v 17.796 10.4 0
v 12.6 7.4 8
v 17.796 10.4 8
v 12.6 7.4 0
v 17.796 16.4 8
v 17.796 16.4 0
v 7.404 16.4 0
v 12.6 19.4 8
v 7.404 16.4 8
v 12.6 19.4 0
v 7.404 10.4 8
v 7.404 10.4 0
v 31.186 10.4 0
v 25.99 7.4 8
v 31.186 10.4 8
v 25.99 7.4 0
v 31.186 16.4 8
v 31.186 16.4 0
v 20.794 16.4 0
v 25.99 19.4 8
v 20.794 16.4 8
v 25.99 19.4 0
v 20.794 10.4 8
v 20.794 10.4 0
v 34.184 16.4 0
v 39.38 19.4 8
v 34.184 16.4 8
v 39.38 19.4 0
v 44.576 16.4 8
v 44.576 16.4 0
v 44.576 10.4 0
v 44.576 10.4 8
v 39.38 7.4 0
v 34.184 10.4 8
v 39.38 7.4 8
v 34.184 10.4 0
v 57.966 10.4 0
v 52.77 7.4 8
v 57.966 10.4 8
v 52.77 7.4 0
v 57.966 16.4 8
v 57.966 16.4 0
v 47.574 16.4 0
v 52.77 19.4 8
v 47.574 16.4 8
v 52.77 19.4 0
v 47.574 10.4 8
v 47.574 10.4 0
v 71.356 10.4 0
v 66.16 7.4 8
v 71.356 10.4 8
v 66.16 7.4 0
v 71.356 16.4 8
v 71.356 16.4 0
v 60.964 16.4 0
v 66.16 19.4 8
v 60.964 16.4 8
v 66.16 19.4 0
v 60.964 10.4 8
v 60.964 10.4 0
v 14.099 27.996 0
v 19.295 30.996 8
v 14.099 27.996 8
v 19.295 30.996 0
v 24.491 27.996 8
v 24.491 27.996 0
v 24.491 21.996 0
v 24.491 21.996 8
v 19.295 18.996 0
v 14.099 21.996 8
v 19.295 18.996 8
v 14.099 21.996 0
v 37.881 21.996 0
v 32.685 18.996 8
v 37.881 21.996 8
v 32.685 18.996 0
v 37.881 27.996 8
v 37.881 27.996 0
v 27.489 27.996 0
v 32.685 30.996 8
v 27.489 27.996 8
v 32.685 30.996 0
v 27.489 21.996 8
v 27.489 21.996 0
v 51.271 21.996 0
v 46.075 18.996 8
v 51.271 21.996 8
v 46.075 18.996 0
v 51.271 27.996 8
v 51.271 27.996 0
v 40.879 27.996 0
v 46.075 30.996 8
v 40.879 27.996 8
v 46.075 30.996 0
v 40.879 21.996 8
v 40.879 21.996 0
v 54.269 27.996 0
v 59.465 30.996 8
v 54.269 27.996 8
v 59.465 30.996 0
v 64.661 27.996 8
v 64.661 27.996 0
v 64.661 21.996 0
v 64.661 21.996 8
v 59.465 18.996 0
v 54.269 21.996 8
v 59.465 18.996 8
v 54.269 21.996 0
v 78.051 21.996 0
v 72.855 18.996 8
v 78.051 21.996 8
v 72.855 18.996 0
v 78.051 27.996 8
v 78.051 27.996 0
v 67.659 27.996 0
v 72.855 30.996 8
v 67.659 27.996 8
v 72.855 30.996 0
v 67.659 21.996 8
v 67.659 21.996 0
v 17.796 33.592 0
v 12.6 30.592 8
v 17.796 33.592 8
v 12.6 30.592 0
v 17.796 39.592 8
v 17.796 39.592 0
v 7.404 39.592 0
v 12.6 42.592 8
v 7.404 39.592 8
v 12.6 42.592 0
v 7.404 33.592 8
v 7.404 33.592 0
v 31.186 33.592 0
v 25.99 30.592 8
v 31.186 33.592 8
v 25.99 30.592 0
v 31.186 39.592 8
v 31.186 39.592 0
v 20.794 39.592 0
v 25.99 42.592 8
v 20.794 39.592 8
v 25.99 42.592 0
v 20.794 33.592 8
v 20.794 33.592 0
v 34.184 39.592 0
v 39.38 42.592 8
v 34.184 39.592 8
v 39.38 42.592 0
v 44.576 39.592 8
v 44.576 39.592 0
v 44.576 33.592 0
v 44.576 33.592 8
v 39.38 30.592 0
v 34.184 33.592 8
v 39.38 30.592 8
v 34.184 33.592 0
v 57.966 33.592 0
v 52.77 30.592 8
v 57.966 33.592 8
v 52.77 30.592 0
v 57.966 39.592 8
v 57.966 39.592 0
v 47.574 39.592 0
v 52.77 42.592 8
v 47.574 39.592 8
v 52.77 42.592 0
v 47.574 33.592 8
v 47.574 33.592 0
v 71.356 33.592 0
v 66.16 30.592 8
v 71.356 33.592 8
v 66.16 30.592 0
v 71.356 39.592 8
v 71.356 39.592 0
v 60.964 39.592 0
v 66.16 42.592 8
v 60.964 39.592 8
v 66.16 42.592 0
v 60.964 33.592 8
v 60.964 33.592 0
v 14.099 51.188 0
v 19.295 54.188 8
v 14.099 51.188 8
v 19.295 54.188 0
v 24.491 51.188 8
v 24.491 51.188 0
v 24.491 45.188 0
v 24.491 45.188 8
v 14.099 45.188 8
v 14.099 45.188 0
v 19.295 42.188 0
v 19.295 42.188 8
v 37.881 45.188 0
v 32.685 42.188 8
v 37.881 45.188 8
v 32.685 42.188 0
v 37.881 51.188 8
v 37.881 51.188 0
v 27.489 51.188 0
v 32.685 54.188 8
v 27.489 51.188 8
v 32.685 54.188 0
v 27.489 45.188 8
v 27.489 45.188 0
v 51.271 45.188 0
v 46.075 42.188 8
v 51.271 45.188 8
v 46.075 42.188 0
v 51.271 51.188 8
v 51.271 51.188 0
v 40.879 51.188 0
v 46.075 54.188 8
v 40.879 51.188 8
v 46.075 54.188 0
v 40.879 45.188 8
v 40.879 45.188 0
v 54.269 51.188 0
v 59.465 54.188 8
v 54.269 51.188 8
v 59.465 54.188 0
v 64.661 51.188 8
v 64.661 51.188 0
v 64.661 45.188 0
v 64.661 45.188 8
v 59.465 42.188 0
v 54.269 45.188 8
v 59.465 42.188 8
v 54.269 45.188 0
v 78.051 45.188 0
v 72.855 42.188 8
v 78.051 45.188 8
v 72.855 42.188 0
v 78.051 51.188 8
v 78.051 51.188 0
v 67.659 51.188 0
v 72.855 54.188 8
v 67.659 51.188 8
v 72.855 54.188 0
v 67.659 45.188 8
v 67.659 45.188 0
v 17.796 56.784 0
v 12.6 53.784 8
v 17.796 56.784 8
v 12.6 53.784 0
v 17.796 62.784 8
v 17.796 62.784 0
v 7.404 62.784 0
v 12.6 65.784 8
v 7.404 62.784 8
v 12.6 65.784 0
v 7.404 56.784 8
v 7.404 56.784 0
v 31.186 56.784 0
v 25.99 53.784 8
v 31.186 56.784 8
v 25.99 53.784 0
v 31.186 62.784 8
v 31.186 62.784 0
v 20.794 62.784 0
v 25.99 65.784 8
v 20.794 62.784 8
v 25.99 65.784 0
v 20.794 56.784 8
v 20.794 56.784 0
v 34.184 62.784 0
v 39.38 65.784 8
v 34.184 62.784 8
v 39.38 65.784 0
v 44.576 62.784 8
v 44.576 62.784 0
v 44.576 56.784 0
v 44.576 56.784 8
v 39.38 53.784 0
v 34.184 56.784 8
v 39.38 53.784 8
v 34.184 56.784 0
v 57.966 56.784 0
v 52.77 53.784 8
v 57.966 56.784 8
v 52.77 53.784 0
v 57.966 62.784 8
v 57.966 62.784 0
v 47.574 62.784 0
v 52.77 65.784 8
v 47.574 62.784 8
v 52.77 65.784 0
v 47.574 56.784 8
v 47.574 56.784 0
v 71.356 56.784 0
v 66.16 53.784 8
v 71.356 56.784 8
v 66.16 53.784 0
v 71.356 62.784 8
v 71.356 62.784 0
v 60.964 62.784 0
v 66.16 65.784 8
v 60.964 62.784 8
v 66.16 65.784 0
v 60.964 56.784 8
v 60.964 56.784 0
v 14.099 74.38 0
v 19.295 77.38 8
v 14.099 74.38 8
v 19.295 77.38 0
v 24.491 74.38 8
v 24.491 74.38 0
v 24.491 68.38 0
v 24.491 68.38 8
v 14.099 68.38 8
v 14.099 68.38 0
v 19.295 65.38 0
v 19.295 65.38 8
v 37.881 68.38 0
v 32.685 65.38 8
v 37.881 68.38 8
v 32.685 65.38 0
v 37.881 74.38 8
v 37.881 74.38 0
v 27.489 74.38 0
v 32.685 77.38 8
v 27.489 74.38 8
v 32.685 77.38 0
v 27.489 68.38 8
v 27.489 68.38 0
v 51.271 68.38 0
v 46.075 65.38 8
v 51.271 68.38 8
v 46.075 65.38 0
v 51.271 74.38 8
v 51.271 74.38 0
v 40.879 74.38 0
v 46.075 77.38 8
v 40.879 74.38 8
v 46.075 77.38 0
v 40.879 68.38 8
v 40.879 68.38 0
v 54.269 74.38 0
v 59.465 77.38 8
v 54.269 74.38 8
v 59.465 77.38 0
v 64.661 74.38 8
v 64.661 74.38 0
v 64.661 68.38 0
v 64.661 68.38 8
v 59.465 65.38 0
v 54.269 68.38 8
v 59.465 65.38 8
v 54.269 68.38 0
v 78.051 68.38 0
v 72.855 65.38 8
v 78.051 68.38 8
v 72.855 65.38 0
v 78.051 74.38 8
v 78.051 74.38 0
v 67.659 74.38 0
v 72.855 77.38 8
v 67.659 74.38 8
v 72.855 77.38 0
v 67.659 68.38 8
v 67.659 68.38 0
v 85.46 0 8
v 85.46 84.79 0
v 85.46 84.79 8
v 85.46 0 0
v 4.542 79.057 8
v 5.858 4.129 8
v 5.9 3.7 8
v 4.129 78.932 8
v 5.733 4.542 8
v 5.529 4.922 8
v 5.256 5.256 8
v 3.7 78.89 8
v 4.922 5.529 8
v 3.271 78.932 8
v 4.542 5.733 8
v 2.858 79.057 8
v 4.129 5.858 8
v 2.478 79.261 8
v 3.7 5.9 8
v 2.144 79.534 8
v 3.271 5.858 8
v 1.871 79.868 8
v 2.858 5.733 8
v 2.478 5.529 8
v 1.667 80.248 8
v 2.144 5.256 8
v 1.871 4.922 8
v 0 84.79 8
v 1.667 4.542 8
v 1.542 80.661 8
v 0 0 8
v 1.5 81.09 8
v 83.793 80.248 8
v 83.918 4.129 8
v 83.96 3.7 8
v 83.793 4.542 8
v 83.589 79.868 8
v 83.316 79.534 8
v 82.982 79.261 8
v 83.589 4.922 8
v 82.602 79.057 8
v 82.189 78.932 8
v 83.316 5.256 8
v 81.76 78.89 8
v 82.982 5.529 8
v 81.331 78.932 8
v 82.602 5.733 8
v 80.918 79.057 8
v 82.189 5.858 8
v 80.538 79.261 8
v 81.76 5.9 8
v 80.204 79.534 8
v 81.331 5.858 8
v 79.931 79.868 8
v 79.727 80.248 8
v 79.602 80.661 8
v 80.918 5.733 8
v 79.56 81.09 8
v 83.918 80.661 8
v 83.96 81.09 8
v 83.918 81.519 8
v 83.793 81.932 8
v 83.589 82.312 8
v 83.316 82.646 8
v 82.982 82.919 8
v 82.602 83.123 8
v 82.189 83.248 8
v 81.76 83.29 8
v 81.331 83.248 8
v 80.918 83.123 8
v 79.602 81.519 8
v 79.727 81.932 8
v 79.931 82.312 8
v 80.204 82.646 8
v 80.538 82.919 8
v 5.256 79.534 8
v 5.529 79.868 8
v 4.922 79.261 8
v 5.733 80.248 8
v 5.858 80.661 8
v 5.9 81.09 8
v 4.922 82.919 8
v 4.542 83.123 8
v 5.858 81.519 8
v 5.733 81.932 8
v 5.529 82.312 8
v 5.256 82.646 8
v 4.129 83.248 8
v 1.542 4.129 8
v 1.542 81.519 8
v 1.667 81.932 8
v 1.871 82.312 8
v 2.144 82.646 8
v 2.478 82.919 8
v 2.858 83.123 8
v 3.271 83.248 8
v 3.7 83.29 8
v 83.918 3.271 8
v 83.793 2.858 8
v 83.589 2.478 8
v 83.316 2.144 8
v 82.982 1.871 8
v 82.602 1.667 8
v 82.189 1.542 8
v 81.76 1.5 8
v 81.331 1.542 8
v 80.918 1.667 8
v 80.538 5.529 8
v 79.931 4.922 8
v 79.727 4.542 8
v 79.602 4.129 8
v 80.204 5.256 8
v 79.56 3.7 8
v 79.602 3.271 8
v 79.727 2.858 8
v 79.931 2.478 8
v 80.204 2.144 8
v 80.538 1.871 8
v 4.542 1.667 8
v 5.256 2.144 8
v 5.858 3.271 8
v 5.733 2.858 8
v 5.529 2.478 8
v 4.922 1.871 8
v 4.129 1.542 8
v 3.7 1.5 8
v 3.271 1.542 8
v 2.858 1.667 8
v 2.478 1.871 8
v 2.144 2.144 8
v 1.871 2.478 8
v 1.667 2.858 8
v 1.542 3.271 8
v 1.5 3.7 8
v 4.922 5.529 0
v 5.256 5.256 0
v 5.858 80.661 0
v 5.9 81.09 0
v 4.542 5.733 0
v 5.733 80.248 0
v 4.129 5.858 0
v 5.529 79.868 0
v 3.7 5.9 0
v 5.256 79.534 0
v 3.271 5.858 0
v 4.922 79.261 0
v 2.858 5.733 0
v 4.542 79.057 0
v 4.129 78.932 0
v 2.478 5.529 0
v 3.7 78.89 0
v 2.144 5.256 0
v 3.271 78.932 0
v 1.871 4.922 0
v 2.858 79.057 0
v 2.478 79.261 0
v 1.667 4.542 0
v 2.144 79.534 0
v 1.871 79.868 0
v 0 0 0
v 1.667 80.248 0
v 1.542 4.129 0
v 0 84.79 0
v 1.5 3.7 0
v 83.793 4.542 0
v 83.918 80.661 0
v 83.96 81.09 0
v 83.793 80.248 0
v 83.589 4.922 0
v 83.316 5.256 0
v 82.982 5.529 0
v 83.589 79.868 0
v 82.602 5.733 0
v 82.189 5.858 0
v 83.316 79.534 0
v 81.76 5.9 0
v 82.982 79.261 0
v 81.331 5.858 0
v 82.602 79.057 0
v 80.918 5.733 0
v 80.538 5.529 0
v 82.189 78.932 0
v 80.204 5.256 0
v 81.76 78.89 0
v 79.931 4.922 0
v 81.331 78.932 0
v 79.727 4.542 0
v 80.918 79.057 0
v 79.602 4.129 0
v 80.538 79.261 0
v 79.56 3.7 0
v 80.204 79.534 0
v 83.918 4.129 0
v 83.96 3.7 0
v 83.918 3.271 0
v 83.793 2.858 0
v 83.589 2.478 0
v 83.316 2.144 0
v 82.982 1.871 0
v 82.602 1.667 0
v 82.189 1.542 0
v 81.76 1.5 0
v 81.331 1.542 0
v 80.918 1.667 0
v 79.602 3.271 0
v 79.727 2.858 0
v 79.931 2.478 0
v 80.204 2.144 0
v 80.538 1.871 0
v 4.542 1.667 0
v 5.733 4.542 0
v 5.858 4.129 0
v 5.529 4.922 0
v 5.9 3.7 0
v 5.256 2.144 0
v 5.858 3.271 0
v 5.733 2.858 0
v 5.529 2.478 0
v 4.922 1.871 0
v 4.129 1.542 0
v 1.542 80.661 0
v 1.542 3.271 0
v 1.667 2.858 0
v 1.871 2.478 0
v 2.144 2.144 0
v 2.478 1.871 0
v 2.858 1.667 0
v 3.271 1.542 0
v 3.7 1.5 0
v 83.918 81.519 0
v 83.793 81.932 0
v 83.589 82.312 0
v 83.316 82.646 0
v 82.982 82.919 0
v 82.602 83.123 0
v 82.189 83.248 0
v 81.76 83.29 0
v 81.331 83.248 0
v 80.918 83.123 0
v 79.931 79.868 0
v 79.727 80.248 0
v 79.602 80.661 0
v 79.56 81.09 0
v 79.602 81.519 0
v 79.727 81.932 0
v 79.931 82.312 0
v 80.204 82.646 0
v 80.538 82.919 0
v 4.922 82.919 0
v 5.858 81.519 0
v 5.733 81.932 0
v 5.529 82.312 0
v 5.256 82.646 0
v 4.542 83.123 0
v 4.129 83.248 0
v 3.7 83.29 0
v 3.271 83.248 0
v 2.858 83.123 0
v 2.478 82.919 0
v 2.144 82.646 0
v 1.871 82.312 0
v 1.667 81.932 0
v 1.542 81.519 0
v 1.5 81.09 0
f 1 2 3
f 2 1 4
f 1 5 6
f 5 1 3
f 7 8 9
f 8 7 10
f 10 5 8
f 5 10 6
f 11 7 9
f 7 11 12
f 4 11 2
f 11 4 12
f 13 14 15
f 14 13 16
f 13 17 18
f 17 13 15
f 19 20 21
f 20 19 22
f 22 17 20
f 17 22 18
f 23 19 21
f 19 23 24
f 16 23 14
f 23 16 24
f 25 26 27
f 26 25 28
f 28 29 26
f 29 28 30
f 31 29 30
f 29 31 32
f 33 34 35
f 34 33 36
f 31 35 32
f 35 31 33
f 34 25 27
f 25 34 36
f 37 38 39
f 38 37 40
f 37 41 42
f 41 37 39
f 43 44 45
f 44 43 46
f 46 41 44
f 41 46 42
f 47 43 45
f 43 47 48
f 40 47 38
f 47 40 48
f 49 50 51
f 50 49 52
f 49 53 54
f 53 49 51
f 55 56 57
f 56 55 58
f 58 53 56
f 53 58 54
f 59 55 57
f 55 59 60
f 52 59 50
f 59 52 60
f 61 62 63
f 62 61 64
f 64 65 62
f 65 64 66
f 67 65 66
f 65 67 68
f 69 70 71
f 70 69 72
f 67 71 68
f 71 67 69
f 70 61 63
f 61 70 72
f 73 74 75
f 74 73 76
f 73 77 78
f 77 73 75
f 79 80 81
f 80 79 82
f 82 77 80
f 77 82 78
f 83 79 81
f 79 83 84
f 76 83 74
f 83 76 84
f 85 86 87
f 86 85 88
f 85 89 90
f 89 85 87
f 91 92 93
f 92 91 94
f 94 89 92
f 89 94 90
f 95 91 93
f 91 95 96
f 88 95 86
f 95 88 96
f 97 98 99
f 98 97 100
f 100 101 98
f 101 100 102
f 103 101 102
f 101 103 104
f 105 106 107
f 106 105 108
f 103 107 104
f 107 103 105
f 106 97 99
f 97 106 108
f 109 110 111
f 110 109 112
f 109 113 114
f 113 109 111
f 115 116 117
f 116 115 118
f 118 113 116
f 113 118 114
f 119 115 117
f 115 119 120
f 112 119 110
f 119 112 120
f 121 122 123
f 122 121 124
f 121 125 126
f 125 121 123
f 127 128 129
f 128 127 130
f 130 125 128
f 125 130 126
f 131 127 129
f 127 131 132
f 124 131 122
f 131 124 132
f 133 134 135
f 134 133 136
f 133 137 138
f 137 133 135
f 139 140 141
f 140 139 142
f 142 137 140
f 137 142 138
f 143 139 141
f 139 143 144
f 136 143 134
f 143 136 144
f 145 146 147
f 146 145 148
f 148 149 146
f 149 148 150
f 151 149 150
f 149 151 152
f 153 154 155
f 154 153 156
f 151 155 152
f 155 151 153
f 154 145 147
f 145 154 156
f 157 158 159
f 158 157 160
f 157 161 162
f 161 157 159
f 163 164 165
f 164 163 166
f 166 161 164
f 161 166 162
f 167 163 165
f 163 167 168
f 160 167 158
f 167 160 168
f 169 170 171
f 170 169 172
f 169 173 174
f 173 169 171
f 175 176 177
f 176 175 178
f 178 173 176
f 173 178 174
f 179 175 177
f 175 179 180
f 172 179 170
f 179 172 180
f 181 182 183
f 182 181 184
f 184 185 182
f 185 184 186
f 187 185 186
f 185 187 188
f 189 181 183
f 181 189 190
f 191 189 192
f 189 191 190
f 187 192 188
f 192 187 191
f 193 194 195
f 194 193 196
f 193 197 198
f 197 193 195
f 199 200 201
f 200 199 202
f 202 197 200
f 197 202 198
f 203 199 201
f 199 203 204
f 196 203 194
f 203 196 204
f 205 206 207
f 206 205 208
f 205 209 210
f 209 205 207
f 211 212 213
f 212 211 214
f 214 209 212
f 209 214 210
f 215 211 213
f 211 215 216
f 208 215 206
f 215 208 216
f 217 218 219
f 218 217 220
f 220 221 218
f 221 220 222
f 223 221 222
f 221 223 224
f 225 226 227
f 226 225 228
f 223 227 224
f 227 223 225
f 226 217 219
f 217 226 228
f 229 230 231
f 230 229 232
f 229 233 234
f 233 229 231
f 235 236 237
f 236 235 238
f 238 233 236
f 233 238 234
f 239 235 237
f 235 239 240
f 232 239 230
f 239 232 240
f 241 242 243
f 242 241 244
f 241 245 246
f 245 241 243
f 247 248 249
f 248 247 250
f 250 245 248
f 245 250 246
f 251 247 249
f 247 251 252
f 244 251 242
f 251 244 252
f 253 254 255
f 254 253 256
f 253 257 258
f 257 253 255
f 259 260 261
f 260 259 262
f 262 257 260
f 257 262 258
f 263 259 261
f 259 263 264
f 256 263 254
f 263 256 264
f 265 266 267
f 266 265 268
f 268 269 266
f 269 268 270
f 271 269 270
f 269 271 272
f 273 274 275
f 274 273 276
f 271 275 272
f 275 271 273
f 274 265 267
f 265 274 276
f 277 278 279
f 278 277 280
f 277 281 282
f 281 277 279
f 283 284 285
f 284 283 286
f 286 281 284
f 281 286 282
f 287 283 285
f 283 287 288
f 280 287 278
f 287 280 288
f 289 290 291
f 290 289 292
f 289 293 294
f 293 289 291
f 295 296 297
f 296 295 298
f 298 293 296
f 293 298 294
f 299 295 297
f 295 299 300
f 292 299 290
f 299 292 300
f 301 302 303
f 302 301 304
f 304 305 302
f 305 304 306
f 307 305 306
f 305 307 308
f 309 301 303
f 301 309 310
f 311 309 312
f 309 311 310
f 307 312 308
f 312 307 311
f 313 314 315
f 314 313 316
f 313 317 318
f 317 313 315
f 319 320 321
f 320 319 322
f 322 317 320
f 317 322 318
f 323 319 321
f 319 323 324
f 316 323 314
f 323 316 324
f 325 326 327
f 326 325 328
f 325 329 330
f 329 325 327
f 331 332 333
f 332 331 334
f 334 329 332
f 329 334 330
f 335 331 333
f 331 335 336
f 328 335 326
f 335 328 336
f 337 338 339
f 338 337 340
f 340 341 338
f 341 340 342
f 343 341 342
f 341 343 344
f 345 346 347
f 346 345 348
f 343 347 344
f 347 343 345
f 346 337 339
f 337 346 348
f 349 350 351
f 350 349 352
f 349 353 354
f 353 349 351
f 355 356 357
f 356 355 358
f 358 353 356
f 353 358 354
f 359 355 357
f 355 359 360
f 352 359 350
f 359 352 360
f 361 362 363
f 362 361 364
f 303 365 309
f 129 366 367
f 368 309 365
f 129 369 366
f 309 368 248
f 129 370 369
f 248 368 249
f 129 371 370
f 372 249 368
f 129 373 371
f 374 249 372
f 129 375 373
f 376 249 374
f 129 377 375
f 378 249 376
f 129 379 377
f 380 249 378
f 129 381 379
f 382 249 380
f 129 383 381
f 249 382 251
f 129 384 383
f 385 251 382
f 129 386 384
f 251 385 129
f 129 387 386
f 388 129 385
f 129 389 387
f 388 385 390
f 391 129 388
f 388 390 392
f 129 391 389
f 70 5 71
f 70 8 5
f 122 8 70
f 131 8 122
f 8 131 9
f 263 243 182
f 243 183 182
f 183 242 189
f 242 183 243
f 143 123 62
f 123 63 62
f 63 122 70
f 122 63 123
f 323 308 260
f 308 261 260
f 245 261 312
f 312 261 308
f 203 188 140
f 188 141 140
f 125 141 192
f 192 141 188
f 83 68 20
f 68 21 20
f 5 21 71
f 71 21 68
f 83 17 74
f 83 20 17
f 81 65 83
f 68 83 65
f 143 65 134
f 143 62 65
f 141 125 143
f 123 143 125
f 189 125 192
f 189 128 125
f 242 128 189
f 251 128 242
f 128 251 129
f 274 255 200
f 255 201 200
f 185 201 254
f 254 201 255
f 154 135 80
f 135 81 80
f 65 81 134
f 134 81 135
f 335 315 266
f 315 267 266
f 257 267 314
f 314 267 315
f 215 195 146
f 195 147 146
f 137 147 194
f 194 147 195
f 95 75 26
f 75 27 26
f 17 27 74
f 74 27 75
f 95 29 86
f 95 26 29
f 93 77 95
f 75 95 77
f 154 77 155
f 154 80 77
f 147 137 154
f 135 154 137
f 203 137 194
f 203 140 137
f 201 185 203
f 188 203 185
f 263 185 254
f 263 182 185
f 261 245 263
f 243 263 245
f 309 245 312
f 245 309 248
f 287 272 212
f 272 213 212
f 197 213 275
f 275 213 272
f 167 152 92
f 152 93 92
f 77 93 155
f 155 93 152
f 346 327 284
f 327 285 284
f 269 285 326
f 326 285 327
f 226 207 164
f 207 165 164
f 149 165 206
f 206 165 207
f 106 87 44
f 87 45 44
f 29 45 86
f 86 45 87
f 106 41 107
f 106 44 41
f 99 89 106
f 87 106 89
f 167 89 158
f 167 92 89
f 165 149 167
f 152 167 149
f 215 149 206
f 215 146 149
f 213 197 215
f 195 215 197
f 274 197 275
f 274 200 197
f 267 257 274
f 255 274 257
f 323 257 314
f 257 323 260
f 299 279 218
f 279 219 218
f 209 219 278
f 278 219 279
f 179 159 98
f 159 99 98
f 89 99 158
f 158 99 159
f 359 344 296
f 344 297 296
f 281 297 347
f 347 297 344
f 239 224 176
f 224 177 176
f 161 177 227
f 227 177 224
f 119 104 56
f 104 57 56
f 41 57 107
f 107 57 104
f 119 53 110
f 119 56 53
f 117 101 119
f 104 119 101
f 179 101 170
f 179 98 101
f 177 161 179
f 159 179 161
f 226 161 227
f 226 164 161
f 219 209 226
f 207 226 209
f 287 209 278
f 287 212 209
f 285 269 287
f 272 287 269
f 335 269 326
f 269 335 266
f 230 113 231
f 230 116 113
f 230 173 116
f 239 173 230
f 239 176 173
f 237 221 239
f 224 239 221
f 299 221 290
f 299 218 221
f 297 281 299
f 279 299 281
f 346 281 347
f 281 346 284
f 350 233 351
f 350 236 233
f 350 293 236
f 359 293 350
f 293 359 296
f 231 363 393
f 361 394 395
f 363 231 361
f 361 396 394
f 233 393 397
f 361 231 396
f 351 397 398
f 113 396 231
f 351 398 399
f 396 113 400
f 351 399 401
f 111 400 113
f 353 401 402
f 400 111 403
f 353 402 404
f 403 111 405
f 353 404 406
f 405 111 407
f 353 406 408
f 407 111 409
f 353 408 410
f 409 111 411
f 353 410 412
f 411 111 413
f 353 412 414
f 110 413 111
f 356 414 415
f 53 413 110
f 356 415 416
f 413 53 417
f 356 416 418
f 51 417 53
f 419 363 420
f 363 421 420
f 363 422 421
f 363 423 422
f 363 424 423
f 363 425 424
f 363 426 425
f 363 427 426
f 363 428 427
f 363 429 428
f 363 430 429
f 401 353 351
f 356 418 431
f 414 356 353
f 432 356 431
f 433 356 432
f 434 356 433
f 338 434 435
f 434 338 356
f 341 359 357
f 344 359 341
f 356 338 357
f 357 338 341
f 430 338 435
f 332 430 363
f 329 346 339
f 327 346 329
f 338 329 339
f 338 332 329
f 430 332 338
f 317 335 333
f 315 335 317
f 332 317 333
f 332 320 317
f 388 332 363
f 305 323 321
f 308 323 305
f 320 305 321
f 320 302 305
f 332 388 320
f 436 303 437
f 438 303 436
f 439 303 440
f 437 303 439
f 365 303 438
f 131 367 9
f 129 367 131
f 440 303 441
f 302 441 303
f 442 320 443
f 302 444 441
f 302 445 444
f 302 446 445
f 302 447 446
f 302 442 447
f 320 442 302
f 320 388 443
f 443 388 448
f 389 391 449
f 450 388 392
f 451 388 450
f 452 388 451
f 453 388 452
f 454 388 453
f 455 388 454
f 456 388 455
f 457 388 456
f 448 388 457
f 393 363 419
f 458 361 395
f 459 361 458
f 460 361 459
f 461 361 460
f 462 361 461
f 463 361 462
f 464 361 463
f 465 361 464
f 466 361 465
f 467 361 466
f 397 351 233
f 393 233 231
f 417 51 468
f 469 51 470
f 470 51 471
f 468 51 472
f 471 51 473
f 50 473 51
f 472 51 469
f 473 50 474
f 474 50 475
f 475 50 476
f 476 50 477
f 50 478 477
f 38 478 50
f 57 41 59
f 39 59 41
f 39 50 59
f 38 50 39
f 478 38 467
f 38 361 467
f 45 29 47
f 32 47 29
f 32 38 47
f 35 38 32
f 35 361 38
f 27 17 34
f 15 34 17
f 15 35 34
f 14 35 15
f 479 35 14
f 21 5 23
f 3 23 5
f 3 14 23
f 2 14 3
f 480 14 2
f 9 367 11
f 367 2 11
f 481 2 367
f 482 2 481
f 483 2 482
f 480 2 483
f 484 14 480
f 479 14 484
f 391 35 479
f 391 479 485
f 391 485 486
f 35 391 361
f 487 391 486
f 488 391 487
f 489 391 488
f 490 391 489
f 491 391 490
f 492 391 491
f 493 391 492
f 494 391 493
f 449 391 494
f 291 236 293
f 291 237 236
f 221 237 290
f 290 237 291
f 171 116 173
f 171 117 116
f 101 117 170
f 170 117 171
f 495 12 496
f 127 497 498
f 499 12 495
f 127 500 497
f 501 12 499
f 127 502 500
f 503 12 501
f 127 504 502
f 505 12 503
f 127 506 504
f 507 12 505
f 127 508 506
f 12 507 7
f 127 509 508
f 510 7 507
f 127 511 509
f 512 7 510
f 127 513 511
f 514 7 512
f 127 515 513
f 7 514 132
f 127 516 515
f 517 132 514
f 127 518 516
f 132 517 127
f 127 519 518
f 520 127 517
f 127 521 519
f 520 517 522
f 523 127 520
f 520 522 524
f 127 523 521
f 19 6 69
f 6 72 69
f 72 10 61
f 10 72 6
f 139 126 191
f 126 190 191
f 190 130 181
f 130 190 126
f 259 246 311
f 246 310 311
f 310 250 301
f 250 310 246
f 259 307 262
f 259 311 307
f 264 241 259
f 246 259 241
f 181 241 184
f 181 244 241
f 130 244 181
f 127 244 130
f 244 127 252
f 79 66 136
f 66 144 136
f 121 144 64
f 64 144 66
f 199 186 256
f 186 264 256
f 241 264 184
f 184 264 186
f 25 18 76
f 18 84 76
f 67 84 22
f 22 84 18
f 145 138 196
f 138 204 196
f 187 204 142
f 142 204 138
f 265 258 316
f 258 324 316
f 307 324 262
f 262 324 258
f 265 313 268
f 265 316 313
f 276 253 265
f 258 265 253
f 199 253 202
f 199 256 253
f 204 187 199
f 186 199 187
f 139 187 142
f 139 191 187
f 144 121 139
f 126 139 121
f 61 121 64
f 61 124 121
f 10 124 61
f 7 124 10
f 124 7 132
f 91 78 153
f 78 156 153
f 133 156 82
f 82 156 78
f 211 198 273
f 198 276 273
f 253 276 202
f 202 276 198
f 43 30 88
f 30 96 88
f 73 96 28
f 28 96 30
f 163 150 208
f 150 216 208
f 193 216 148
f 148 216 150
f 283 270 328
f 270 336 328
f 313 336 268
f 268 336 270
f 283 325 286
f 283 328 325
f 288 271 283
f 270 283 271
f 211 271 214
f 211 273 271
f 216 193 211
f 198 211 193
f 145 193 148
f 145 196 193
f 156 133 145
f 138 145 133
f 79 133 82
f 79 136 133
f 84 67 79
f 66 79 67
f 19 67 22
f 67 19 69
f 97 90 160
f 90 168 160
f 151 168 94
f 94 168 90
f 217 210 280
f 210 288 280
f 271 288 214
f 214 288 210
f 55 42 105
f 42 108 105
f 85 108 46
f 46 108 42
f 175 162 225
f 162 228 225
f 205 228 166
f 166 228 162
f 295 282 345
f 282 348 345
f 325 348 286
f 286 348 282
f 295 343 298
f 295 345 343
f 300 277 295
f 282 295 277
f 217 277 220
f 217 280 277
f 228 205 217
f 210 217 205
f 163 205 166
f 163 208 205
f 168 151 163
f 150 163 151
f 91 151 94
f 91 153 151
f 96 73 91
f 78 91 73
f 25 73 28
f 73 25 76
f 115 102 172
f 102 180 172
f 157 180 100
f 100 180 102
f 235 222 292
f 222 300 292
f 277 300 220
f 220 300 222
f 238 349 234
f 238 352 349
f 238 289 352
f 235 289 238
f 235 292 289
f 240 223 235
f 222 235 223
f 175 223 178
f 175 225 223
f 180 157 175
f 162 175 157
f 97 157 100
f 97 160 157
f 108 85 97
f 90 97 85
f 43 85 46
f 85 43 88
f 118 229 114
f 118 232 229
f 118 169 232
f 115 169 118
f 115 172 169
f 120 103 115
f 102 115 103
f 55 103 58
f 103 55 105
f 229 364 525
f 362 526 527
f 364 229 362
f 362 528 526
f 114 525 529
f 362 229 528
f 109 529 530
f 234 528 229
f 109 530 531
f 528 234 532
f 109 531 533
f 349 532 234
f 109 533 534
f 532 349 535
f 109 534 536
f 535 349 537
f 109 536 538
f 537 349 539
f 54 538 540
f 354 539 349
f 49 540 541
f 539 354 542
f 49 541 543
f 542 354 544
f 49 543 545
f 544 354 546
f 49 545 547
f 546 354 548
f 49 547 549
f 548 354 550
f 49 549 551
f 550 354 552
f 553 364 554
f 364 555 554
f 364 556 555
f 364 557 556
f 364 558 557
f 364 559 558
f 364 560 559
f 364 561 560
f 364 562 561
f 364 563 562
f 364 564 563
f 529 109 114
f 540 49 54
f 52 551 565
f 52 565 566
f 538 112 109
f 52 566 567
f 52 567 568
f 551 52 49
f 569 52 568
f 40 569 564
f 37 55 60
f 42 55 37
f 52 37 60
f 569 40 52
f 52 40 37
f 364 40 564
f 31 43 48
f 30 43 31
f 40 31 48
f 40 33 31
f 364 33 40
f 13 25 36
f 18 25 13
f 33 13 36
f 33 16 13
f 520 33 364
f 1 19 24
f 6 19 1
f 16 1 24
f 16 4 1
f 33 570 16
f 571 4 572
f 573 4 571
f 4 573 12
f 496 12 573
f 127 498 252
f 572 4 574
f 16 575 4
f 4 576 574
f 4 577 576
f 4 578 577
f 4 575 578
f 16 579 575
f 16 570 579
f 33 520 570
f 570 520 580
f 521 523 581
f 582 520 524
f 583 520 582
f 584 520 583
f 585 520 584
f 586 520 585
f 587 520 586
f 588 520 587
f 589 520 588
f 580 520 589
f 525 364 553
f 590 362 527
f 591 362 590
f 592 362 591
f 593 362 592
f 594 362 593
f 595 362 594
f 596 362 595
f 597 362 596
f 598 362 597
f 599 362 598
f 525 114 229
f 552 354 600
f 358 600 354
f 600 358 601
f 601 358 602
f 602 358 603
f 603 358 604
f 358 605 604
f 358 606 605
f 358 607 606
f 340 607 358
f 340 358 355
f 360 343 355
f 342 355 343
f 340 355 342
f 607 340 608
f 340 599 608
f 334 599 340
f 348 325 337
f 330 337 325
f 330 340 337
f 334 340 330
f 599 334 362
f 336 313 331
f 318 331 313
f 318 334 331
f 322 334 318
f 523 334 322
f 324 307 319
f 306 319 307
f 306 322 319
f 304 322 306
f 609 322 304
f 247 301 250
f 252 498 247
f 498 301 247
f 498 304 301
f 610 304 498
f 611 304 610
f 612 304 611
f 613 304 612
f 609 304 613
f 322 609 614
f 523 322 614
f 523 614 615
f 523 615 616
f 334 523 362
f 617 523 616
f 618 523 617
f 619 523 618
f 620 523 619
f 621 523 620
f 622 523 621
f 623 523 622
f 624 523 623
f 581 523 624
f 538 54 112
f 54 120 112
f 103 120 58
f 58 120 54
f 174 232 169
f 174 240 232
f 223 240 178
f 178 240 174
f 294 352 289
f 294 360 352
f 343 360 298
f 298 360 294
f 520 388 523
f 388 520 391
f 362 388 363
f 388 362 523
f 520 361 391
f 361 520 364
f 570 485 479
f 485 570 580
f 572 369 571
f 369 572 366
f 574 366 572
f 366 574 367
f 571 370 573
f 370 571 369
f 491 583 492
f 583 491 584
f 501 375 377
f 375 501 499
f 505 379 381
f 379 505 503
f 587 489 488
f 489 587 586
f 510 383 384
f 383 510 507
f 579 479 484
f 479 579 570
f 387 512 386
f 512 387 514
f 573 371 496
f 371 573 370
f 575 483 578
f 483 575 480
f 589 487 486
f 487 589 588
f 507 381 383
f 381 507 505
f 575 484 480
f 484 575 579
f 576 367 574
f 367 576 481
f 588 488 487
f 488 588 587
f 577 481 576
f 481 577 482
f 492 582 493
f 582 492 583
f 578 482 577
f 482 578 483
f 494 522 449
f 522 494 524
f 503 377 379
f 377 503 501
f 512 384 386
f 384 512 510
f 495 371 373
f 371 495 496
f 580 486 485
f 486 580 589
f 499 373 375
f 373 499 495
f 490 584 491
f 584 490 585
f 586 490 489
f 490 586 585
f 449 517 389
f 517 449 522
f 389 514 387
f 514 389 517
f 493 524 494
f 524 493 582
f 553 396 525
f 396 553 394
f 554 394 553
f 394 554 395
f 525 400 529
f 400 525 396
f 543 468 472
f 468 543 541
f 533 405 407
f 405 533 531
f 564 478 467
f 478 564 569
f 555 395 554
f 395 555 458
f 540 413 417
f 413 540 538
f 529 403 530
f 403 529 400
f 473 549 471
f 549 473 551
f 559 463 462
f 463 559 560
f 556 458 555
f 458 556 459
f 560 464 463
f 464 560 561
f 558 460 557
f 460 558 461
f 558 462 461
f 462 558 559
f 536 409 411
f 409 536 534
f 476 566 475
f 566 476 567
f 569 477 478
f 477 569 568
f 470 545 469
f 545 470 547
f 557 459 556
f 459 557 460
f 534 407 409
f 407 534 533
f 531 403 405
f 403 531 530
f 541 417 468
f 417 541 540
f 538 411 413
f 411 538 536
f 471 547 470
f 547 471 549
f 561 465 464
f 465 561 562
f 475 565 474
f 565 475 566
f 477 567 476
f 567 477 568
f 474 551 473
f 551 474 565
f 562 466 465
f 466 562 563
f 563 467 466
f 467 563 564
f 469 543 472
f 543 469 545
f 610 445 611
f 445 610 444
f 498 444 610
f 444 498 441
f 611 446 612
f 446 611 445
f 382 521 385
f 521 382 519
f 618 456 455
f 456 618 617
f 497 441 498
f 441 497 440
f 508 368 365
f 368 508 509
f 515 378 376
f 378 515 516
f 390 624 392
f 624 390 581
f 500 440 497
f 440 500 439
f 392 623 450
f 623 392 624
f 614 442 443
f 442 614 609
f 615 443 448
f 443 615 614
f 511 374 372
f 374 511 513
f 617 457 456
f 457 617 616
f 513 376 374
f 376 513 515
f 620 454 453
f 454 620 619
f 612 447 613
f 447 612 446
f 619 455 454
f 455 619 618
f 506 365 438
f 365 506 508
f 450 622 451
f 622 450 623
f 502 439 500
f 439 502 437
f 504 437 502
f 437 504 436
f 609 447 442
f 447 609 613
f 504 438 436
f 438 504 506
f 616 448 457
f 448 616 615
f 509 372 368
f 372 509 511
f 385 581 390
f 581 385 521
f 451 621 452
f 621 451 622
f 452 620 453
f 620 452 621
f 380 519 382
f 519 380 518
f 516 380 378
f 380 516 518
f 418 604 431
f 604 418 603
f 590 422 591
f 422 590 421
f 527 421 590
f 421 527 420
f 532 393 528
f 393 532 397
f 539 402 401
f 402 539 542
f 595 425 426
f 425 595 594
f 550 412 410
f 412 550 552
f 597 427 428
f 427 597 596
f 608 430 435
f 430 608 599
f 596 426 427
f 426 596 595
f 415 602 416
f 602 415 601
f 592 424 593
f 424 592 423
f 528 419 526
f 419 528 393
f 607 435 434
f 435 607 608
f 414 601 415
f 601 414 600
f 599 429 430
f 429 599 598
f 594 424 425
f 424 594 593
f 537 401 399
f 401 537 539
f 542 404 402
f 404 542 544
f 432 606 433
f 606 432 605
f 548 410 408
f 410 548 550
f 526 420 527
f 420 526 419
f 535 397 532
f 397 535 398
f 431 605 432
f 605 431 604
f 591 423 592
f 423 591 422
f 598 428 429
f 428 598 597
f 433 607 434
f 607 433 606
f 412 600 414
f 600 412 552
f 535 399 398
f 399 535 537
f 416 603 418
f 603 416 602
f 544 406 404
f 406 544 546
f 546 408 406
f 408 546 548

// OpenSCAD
$fn = 32;

// ----------------------------------------------------------------------
// Honeycomb panel: 85.46 x 84.79 mm, 30 cells of 12 mm
// ----------------------------------------------------------------------

// --- parameters (mm) ---
panel_w = 85.46;          // panel width
panel_d = 84.79;          // panel depth
thick = 8;                // panel thickness
cell_r = 6;               // hex cell circumradius
pitch = 13.39;            // hex cell pitch (centre to centre)
web = 3;                  // web between the cells
columns = 5;              // columns of cells
rows = 6;                 // rows of cells
cell_count = 30;          // total cells
shift_x = 12.6;           // first cell offset in x
shift_y = 13.4;           // first cell offset in y
mount_d = 4.4;            // corner mounting holes
hole_off = 3.7;           // mounting hole offset from the corners

difference() {
  union() {
    cube([panel_w, panel_d, thick]);
  }
  /* hexagonal cells, point-up, cut right through the plate */
  for (row = [0 : rows - 1]) {
    for (col = [0 : columns - 1]) {
      translate([shift_x + col * pitch + (row % 2) * pitch / 2, shift_y + row * pitch * 0.866025, -2.5]) rotate([0, 0, 30]) cylinder(h = thick + 5, d = 2 * cell_r, $fn = 6);
    }
  }
  /* corner mounting holes, clear of the outer cell web */
  translate([3.7, 3.7, -2.5]) cylinder(h = thick + 5, d = mount_d);
  translate([81.76, 3.7, -2.5]) cylinder(h = thick + 5, d = mount_d);
  translate([3.7, 81.09, -2.5]) cylinder(h = thick + 5, d = mount_d);
  translate([81.76, 81.09, -2.5]) cylinder(h = thick + 5, d = mount_d);
}
